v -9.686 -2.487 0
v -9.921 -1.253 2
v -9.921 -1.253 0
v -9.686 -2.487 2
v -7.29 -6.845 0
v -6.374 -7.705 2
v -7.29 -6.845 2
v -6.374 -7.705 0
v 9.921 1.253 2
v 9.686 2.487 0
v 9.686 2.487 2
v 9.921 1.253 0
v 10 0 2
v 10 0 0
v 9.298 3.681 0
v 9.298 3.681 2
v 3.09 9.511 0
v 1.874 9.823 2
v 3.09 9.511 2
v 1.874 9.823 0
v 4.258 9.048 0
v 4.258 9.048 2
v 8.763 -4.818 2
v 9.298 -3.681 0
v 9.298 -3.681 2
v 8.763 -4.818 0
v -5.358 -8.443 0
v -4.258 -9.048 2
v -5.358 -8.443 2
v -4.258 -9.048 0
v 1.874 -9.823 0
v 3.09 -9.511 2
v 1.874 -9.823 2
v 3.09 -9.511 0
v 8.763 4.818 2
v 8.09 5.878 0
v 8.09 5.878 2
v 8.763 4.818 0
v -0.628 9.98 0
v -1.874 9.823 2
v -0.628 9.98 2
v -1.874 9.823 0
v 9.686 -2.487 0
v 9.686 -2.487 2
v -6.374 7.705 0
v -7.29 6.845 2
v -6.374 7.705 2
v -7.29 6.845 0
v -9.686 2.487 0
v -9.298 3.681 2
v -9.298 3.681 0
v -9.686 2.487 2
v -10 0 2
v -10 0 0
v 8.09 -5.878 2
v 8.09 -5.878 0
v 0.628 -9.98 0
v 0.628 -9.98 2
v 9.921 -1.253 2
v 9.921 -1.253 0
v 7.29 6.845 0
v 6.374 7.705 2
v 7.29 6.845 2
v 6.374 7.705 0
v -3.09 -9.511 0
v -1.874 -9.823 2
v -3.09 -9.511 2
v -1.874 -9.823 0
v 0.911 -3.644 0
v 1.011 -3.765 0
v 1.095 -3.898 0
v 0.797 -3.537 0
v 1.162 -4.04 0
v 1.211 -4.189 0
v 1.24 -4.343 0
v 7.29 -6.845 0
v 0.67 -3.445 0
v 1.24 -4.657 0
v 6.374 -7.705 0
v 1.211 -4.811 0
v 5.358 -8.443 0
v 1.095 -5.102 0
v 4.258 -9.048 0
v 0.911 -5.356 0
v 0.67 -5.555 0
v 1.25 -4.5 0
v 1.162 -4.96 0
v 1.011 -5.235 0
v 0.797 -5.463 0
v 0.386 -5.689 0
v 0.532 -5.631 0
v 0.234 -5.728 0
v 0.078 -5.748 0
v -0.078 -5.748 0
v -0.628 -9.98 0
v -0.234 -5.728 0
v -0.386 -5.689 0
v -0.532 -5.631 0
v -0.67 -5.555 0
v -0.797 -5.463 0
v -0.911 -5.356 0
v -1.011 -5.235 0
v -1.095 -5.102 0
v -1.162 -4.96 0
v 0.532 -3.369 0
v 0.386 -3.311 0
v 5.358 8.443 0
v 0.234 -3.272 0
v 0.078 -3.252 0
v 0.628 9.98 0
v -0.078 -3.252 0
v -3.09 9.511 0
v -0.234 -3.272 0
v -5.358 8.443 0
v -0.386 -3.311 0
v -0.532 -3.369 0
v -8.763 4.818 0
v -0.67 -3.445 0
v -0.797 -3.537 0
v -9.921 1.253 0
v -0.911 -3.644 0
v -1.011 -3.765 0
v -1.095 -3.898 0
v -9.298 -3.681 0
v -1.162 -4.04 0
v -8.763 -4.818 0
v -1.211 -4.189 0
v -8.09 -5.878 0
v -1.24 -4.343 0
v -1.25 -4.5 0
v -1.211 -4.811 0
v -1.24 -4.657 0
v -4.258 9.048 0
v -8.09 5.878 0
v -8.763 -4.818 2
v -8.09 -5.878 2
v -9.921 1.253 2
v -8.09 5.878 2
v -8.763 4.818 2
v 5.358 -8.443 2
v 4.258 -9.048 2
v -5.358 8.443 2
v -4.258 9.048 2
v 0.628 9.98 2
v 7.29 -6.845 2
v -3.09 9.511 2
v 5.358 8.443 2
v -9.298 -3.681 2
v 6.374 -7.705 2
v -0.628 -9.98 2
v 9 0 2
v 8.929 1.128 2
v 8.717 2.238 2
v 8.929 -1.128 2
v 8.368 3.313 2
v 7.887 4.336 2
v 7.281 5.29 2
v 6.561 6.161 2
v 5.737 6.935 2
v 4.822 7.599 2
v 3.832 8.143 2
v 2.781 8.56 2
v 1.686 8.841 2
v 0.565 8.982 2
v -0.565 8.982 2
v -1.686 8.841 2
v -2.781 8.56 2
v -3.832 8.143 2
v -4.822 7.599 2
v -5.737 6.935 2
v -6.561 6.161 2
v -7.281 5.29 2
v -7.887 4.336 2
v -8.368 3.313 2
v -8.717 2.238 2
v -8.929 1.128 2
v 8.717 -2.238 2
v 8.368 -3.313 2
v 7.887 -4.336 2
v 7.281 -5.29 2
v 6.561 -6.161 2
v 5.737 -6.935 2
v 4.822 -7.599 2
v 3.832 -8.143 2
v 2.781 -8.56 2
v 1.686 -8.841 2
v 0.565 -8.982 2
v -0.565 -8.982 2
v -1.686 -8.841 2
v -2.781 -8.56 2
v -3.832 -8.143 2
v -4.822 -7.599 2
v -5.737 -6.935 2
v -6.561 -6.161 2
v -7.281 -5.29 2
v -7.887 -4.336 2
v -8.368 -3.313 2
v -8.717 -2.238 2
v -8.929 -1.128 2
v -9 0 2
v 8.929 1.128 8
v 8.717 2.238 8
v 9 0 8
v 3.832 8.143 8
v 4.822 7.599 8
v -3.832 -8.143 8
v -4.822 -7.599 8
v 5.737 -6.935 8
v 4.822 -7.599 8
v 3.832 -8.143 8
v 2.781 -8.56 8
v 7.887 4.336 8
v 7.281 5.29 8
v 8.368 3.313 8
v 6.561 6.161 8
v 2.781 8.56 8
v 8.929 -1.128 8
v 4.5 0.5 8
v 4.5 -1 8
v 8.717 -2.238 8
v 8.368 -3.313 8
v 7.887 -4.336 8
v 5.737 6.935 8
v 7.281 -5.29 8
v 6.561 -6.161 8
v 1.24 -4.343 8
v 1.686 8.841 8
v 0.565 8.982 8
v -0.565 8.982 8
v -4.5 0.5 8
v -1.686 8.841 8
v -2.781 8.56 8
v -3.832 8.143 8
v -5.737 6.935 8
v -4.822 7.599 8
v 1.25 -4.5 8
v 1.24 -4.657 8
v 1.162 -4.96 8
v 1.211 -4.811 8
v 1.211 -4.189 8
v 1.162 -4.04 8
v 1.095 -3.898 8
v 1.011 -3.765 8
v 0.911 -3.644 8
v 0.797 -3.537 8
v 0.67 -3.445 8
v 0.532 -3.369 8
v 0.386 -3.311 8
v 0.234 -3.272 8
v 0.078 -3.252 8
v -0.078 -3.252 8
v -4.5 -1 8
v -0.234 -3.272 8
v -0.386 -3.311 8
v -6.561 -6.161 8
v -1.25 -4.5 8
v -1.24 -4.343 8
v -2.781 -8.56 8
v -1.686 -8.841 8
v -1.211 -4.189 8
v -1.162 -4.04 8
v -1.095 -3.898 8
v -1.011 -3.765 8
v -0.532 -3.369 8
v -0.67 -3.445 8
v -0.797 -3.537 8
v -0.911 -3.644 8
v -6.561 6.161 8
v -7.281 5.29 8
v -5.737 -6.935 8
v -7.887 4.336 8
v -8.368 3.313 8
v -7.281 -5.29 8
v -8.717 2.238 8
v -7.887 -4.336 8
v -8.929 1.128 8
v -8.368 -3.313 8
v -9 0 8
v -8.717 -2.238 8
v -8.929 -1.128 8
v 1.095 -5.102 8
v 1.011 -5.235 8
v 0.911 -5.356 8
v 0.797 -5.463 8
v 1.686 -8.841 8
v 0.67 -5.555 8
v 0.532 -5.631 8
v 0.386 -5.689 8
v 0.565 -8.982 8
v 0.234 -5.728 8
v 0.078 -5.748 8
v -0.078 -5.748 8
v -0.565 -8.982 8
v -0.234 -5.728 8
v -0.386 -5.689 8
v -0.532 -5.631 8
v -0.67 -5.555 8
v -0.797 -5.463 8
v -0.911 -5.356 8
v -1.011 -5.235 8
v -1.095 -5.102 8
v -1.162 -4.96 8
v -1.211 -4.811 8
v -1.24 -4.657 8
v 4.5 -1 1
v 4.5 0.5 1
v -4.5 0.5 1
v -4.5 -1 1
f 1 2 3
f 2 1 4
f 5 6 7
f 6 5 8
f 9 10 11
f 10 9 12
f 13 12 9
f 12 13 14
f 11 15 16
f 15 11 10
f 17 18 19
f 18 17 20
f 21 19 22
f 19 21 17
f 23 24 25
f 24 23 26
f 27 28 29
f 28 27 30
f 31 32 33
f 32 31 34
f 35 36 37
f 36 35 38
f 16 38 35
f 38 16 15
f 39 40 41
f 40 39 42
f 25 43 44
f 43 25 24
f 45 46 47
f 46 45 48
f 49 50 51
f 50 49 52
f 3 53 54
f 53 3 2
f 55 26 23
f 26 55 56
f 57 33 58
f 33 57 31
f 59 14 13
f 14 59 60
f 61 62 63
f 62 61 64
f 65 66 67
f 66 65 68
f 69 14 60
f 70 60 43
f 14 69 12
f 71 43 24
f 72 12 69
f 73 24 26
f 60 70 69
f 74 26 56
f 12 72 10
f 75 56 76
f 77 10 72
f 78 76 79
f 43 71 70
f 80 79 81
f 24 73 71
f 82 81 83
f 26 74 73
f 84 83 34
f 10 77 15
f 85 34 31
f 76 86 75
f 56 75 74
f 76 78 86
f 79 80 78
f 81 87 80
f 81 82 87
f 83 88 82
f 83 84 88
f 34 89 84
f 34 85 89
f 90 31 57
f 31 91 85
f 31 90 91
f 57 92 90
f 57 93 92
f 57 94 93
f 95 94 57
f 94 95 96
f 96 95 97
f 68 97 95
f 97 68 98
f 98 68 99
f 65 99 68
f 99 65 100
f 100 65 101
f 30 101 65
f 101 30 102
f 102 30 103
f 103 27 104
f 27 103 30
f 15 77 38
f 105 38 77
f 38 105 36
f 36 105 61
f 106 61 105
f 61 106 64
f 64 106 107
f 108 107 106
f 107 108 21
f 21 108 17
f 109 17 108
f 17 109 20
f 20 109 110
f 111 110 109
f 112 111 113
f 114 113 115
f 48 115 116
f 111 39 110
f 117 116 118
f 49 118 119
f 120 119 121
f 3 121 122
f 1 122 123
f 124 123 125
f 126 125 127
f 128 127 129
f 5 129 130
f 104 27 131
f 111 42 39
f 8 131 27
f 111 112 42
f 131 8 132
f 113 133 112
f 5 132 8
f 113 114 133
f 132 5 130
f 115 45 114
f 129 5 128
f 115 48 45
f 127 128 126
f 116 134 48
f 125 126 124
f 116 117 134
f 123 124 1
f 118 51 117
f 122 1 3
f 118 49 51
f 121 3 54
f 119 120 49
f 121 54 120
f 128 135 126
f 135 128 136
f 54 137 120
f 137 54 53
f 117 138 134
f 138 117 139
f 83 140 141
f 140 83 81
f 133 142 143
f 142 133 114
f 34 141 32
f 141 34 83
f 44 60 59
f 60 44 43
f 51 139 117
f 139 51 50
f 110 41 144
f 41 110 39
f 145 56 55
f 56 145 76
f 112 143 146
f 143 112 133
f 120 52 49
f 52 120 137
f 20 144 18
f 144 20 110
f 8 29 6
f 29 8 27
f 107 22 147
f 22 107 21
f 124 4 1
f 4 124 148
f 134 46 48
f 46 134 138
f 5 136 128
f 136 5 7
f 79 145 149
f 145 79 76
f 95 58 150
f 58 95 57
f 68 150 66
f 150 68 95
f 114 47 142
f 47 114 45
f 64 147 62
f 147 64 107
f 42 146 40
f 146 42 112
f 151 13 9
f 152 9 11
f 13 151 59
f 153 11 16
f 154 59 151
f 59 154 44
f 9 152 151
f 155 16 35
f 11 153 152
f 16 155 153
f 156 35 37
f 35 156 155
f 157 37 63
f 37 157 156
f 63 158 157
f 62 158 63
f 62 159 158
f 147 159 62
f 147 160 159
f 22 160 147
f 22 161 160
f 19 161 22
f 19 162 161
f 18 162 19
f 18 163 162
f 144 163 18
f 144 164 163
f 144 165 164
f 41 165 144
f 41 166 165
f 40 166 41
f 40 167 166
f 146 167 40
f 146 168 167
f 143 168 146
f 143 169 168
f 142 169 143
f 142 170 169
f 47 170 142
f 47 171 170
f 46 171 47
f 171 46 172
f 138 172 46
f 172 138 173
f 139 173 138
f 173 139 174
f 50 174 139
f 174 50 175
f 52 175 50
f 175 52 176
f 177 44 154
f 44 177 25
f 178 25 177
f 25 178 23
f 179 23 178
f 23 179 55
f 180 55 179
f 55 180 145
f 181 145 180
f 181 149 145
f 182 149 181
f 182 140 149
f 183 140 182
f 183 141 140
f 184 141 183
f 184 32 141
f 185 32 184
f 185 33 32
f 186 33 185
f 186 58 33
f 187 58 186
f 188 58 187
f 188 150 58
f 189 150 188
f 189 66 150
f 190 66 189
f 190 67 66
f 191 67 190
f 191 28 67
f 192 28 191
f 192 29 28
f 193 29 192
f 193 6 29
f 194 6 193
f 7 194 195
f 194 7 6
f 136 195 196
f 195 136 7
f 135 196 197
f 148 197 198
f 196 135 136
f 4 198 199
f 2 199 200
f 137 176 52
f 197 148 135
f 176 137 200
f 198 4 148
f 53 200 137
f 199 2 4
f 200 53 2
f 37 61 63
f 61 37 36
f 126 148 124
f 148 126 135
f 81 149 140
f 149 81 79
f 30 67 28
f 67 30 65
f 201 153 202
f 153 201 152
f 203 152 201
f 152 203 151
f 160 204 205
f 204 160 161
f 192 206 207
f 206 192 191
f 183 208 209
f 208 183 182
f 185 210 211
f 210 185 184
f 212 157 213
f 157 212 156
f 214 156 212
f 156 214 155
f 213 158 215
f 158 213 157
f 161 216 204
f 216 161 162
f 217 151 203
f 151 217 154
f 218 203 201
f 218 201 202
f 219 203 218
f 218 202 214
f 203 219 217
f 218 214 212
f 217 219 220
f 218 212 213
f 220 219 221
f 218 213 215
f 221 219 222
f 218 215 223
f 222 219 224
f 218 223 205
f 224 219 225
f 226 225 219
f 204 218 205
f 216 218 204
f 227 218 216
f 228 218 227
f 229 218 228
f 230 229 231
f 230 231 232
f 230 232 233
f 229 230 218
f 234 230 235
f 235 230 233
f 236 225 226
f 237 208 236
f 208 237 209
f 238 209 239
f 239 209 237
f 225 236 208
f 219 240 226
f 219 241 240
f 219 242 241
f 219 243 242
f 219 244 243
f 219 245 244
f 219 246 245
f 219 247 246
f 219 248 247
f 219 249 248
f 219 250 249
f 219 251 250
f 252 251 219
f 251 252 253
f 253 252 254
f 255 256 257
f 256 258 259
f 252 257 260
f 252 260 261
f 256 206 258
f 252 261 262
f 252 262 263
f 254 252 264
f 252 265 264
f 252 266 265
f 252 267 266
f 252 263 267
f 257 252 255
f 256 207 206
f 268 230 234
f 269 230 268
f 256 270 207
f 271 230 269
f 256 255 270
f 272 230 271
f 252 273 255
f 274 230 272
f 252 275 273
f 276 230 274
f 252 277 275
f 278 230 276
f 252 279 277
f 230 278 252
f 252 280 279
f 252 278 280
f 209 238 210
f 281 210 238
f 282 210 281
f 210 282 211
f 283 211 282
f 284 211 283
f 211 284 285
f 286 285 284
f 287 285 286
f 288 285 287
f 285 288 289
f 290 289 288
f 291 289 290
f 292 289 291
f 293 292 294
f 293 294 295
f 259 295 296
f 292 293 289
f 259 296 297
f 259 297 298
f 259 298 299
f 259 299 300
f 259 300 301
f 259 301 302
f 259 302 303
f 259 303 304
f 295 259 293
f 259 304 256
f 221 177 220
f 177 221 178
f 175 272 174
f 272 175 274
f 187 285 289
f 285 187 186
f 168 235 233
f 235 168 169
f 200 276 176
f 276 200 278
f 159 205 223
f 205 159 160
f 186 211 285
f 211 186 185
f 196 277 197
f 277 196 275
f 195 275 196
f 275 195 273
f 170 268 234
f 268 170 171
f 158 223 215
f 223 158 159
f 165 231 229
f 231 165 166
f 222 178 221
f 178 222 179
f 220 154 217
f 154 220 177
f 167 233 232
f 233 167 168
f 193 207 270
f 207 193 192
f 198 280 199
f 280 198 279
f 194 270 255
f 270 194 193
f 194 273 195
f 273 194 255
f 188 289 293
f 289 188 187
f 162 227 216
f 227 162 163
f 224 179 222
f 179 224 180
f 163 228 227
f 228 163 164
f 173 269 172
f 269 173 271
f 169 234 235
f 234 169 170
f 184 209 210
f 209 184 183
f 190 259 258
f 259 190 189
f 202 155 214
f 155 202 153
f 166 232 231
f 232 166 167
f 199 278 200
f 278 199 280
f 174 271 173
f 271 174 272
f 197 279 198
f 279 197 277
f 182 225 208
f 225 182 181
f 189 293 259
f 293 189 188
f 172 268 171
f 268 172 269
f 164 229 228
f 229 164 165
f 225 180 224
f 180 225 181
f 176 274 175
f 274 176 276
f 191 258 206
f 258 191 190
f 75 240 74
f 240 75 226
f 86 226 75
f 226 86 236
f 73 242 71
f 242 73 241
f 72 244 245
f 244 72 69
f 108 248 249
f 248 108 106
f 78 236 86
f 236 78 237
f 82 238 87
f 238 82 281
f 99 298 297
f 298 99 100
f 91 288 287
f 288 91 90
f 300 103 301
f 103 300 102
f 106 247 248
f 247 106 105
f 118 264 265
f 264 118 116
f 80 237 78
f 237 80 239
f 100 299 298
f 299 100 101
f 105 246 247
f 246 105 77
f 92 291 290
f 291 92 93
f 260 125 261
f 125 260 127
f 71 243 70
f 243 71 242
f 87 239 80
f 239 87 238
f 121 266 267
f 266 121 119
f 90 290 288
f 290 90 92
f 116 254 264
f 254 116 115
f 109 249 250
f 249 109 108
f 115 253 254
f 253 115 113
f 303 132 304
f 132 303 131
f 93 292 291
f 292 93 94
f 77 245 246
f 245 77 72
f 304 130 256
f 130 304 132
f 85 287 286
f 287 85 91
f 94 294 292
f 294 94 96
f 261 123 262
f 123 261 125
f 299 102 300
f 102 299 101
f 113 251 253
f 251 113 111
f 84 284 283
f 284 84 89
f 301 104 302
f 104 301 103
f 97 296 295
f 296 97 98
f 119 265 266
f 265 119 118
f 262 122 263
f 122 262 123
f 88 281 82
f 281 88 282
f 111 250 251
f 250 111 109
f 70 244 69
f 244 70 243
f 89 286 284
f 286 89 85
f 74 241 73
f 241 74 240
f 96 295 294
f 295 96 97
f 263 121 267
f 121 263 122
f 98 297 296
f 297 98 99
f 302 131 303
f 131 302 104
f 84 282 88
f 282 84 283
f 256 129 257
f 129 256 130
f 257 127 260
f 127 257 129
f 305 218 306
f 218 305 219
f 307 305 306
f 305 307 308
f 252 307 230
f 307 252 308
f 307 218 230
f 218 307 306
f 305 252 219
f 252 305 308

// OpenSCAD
difference(){
    union(){
    cylinder(d = 20, h = 2, $fn =50);
cylinder(d = 18, h = 8, $fn =50);
    }
translate([0,-4.5,-1])cylinder(d = 2.5, h = 22, $fn =50);
translate([-4.5,-1,1])cube([9,1.5,8]);
}
